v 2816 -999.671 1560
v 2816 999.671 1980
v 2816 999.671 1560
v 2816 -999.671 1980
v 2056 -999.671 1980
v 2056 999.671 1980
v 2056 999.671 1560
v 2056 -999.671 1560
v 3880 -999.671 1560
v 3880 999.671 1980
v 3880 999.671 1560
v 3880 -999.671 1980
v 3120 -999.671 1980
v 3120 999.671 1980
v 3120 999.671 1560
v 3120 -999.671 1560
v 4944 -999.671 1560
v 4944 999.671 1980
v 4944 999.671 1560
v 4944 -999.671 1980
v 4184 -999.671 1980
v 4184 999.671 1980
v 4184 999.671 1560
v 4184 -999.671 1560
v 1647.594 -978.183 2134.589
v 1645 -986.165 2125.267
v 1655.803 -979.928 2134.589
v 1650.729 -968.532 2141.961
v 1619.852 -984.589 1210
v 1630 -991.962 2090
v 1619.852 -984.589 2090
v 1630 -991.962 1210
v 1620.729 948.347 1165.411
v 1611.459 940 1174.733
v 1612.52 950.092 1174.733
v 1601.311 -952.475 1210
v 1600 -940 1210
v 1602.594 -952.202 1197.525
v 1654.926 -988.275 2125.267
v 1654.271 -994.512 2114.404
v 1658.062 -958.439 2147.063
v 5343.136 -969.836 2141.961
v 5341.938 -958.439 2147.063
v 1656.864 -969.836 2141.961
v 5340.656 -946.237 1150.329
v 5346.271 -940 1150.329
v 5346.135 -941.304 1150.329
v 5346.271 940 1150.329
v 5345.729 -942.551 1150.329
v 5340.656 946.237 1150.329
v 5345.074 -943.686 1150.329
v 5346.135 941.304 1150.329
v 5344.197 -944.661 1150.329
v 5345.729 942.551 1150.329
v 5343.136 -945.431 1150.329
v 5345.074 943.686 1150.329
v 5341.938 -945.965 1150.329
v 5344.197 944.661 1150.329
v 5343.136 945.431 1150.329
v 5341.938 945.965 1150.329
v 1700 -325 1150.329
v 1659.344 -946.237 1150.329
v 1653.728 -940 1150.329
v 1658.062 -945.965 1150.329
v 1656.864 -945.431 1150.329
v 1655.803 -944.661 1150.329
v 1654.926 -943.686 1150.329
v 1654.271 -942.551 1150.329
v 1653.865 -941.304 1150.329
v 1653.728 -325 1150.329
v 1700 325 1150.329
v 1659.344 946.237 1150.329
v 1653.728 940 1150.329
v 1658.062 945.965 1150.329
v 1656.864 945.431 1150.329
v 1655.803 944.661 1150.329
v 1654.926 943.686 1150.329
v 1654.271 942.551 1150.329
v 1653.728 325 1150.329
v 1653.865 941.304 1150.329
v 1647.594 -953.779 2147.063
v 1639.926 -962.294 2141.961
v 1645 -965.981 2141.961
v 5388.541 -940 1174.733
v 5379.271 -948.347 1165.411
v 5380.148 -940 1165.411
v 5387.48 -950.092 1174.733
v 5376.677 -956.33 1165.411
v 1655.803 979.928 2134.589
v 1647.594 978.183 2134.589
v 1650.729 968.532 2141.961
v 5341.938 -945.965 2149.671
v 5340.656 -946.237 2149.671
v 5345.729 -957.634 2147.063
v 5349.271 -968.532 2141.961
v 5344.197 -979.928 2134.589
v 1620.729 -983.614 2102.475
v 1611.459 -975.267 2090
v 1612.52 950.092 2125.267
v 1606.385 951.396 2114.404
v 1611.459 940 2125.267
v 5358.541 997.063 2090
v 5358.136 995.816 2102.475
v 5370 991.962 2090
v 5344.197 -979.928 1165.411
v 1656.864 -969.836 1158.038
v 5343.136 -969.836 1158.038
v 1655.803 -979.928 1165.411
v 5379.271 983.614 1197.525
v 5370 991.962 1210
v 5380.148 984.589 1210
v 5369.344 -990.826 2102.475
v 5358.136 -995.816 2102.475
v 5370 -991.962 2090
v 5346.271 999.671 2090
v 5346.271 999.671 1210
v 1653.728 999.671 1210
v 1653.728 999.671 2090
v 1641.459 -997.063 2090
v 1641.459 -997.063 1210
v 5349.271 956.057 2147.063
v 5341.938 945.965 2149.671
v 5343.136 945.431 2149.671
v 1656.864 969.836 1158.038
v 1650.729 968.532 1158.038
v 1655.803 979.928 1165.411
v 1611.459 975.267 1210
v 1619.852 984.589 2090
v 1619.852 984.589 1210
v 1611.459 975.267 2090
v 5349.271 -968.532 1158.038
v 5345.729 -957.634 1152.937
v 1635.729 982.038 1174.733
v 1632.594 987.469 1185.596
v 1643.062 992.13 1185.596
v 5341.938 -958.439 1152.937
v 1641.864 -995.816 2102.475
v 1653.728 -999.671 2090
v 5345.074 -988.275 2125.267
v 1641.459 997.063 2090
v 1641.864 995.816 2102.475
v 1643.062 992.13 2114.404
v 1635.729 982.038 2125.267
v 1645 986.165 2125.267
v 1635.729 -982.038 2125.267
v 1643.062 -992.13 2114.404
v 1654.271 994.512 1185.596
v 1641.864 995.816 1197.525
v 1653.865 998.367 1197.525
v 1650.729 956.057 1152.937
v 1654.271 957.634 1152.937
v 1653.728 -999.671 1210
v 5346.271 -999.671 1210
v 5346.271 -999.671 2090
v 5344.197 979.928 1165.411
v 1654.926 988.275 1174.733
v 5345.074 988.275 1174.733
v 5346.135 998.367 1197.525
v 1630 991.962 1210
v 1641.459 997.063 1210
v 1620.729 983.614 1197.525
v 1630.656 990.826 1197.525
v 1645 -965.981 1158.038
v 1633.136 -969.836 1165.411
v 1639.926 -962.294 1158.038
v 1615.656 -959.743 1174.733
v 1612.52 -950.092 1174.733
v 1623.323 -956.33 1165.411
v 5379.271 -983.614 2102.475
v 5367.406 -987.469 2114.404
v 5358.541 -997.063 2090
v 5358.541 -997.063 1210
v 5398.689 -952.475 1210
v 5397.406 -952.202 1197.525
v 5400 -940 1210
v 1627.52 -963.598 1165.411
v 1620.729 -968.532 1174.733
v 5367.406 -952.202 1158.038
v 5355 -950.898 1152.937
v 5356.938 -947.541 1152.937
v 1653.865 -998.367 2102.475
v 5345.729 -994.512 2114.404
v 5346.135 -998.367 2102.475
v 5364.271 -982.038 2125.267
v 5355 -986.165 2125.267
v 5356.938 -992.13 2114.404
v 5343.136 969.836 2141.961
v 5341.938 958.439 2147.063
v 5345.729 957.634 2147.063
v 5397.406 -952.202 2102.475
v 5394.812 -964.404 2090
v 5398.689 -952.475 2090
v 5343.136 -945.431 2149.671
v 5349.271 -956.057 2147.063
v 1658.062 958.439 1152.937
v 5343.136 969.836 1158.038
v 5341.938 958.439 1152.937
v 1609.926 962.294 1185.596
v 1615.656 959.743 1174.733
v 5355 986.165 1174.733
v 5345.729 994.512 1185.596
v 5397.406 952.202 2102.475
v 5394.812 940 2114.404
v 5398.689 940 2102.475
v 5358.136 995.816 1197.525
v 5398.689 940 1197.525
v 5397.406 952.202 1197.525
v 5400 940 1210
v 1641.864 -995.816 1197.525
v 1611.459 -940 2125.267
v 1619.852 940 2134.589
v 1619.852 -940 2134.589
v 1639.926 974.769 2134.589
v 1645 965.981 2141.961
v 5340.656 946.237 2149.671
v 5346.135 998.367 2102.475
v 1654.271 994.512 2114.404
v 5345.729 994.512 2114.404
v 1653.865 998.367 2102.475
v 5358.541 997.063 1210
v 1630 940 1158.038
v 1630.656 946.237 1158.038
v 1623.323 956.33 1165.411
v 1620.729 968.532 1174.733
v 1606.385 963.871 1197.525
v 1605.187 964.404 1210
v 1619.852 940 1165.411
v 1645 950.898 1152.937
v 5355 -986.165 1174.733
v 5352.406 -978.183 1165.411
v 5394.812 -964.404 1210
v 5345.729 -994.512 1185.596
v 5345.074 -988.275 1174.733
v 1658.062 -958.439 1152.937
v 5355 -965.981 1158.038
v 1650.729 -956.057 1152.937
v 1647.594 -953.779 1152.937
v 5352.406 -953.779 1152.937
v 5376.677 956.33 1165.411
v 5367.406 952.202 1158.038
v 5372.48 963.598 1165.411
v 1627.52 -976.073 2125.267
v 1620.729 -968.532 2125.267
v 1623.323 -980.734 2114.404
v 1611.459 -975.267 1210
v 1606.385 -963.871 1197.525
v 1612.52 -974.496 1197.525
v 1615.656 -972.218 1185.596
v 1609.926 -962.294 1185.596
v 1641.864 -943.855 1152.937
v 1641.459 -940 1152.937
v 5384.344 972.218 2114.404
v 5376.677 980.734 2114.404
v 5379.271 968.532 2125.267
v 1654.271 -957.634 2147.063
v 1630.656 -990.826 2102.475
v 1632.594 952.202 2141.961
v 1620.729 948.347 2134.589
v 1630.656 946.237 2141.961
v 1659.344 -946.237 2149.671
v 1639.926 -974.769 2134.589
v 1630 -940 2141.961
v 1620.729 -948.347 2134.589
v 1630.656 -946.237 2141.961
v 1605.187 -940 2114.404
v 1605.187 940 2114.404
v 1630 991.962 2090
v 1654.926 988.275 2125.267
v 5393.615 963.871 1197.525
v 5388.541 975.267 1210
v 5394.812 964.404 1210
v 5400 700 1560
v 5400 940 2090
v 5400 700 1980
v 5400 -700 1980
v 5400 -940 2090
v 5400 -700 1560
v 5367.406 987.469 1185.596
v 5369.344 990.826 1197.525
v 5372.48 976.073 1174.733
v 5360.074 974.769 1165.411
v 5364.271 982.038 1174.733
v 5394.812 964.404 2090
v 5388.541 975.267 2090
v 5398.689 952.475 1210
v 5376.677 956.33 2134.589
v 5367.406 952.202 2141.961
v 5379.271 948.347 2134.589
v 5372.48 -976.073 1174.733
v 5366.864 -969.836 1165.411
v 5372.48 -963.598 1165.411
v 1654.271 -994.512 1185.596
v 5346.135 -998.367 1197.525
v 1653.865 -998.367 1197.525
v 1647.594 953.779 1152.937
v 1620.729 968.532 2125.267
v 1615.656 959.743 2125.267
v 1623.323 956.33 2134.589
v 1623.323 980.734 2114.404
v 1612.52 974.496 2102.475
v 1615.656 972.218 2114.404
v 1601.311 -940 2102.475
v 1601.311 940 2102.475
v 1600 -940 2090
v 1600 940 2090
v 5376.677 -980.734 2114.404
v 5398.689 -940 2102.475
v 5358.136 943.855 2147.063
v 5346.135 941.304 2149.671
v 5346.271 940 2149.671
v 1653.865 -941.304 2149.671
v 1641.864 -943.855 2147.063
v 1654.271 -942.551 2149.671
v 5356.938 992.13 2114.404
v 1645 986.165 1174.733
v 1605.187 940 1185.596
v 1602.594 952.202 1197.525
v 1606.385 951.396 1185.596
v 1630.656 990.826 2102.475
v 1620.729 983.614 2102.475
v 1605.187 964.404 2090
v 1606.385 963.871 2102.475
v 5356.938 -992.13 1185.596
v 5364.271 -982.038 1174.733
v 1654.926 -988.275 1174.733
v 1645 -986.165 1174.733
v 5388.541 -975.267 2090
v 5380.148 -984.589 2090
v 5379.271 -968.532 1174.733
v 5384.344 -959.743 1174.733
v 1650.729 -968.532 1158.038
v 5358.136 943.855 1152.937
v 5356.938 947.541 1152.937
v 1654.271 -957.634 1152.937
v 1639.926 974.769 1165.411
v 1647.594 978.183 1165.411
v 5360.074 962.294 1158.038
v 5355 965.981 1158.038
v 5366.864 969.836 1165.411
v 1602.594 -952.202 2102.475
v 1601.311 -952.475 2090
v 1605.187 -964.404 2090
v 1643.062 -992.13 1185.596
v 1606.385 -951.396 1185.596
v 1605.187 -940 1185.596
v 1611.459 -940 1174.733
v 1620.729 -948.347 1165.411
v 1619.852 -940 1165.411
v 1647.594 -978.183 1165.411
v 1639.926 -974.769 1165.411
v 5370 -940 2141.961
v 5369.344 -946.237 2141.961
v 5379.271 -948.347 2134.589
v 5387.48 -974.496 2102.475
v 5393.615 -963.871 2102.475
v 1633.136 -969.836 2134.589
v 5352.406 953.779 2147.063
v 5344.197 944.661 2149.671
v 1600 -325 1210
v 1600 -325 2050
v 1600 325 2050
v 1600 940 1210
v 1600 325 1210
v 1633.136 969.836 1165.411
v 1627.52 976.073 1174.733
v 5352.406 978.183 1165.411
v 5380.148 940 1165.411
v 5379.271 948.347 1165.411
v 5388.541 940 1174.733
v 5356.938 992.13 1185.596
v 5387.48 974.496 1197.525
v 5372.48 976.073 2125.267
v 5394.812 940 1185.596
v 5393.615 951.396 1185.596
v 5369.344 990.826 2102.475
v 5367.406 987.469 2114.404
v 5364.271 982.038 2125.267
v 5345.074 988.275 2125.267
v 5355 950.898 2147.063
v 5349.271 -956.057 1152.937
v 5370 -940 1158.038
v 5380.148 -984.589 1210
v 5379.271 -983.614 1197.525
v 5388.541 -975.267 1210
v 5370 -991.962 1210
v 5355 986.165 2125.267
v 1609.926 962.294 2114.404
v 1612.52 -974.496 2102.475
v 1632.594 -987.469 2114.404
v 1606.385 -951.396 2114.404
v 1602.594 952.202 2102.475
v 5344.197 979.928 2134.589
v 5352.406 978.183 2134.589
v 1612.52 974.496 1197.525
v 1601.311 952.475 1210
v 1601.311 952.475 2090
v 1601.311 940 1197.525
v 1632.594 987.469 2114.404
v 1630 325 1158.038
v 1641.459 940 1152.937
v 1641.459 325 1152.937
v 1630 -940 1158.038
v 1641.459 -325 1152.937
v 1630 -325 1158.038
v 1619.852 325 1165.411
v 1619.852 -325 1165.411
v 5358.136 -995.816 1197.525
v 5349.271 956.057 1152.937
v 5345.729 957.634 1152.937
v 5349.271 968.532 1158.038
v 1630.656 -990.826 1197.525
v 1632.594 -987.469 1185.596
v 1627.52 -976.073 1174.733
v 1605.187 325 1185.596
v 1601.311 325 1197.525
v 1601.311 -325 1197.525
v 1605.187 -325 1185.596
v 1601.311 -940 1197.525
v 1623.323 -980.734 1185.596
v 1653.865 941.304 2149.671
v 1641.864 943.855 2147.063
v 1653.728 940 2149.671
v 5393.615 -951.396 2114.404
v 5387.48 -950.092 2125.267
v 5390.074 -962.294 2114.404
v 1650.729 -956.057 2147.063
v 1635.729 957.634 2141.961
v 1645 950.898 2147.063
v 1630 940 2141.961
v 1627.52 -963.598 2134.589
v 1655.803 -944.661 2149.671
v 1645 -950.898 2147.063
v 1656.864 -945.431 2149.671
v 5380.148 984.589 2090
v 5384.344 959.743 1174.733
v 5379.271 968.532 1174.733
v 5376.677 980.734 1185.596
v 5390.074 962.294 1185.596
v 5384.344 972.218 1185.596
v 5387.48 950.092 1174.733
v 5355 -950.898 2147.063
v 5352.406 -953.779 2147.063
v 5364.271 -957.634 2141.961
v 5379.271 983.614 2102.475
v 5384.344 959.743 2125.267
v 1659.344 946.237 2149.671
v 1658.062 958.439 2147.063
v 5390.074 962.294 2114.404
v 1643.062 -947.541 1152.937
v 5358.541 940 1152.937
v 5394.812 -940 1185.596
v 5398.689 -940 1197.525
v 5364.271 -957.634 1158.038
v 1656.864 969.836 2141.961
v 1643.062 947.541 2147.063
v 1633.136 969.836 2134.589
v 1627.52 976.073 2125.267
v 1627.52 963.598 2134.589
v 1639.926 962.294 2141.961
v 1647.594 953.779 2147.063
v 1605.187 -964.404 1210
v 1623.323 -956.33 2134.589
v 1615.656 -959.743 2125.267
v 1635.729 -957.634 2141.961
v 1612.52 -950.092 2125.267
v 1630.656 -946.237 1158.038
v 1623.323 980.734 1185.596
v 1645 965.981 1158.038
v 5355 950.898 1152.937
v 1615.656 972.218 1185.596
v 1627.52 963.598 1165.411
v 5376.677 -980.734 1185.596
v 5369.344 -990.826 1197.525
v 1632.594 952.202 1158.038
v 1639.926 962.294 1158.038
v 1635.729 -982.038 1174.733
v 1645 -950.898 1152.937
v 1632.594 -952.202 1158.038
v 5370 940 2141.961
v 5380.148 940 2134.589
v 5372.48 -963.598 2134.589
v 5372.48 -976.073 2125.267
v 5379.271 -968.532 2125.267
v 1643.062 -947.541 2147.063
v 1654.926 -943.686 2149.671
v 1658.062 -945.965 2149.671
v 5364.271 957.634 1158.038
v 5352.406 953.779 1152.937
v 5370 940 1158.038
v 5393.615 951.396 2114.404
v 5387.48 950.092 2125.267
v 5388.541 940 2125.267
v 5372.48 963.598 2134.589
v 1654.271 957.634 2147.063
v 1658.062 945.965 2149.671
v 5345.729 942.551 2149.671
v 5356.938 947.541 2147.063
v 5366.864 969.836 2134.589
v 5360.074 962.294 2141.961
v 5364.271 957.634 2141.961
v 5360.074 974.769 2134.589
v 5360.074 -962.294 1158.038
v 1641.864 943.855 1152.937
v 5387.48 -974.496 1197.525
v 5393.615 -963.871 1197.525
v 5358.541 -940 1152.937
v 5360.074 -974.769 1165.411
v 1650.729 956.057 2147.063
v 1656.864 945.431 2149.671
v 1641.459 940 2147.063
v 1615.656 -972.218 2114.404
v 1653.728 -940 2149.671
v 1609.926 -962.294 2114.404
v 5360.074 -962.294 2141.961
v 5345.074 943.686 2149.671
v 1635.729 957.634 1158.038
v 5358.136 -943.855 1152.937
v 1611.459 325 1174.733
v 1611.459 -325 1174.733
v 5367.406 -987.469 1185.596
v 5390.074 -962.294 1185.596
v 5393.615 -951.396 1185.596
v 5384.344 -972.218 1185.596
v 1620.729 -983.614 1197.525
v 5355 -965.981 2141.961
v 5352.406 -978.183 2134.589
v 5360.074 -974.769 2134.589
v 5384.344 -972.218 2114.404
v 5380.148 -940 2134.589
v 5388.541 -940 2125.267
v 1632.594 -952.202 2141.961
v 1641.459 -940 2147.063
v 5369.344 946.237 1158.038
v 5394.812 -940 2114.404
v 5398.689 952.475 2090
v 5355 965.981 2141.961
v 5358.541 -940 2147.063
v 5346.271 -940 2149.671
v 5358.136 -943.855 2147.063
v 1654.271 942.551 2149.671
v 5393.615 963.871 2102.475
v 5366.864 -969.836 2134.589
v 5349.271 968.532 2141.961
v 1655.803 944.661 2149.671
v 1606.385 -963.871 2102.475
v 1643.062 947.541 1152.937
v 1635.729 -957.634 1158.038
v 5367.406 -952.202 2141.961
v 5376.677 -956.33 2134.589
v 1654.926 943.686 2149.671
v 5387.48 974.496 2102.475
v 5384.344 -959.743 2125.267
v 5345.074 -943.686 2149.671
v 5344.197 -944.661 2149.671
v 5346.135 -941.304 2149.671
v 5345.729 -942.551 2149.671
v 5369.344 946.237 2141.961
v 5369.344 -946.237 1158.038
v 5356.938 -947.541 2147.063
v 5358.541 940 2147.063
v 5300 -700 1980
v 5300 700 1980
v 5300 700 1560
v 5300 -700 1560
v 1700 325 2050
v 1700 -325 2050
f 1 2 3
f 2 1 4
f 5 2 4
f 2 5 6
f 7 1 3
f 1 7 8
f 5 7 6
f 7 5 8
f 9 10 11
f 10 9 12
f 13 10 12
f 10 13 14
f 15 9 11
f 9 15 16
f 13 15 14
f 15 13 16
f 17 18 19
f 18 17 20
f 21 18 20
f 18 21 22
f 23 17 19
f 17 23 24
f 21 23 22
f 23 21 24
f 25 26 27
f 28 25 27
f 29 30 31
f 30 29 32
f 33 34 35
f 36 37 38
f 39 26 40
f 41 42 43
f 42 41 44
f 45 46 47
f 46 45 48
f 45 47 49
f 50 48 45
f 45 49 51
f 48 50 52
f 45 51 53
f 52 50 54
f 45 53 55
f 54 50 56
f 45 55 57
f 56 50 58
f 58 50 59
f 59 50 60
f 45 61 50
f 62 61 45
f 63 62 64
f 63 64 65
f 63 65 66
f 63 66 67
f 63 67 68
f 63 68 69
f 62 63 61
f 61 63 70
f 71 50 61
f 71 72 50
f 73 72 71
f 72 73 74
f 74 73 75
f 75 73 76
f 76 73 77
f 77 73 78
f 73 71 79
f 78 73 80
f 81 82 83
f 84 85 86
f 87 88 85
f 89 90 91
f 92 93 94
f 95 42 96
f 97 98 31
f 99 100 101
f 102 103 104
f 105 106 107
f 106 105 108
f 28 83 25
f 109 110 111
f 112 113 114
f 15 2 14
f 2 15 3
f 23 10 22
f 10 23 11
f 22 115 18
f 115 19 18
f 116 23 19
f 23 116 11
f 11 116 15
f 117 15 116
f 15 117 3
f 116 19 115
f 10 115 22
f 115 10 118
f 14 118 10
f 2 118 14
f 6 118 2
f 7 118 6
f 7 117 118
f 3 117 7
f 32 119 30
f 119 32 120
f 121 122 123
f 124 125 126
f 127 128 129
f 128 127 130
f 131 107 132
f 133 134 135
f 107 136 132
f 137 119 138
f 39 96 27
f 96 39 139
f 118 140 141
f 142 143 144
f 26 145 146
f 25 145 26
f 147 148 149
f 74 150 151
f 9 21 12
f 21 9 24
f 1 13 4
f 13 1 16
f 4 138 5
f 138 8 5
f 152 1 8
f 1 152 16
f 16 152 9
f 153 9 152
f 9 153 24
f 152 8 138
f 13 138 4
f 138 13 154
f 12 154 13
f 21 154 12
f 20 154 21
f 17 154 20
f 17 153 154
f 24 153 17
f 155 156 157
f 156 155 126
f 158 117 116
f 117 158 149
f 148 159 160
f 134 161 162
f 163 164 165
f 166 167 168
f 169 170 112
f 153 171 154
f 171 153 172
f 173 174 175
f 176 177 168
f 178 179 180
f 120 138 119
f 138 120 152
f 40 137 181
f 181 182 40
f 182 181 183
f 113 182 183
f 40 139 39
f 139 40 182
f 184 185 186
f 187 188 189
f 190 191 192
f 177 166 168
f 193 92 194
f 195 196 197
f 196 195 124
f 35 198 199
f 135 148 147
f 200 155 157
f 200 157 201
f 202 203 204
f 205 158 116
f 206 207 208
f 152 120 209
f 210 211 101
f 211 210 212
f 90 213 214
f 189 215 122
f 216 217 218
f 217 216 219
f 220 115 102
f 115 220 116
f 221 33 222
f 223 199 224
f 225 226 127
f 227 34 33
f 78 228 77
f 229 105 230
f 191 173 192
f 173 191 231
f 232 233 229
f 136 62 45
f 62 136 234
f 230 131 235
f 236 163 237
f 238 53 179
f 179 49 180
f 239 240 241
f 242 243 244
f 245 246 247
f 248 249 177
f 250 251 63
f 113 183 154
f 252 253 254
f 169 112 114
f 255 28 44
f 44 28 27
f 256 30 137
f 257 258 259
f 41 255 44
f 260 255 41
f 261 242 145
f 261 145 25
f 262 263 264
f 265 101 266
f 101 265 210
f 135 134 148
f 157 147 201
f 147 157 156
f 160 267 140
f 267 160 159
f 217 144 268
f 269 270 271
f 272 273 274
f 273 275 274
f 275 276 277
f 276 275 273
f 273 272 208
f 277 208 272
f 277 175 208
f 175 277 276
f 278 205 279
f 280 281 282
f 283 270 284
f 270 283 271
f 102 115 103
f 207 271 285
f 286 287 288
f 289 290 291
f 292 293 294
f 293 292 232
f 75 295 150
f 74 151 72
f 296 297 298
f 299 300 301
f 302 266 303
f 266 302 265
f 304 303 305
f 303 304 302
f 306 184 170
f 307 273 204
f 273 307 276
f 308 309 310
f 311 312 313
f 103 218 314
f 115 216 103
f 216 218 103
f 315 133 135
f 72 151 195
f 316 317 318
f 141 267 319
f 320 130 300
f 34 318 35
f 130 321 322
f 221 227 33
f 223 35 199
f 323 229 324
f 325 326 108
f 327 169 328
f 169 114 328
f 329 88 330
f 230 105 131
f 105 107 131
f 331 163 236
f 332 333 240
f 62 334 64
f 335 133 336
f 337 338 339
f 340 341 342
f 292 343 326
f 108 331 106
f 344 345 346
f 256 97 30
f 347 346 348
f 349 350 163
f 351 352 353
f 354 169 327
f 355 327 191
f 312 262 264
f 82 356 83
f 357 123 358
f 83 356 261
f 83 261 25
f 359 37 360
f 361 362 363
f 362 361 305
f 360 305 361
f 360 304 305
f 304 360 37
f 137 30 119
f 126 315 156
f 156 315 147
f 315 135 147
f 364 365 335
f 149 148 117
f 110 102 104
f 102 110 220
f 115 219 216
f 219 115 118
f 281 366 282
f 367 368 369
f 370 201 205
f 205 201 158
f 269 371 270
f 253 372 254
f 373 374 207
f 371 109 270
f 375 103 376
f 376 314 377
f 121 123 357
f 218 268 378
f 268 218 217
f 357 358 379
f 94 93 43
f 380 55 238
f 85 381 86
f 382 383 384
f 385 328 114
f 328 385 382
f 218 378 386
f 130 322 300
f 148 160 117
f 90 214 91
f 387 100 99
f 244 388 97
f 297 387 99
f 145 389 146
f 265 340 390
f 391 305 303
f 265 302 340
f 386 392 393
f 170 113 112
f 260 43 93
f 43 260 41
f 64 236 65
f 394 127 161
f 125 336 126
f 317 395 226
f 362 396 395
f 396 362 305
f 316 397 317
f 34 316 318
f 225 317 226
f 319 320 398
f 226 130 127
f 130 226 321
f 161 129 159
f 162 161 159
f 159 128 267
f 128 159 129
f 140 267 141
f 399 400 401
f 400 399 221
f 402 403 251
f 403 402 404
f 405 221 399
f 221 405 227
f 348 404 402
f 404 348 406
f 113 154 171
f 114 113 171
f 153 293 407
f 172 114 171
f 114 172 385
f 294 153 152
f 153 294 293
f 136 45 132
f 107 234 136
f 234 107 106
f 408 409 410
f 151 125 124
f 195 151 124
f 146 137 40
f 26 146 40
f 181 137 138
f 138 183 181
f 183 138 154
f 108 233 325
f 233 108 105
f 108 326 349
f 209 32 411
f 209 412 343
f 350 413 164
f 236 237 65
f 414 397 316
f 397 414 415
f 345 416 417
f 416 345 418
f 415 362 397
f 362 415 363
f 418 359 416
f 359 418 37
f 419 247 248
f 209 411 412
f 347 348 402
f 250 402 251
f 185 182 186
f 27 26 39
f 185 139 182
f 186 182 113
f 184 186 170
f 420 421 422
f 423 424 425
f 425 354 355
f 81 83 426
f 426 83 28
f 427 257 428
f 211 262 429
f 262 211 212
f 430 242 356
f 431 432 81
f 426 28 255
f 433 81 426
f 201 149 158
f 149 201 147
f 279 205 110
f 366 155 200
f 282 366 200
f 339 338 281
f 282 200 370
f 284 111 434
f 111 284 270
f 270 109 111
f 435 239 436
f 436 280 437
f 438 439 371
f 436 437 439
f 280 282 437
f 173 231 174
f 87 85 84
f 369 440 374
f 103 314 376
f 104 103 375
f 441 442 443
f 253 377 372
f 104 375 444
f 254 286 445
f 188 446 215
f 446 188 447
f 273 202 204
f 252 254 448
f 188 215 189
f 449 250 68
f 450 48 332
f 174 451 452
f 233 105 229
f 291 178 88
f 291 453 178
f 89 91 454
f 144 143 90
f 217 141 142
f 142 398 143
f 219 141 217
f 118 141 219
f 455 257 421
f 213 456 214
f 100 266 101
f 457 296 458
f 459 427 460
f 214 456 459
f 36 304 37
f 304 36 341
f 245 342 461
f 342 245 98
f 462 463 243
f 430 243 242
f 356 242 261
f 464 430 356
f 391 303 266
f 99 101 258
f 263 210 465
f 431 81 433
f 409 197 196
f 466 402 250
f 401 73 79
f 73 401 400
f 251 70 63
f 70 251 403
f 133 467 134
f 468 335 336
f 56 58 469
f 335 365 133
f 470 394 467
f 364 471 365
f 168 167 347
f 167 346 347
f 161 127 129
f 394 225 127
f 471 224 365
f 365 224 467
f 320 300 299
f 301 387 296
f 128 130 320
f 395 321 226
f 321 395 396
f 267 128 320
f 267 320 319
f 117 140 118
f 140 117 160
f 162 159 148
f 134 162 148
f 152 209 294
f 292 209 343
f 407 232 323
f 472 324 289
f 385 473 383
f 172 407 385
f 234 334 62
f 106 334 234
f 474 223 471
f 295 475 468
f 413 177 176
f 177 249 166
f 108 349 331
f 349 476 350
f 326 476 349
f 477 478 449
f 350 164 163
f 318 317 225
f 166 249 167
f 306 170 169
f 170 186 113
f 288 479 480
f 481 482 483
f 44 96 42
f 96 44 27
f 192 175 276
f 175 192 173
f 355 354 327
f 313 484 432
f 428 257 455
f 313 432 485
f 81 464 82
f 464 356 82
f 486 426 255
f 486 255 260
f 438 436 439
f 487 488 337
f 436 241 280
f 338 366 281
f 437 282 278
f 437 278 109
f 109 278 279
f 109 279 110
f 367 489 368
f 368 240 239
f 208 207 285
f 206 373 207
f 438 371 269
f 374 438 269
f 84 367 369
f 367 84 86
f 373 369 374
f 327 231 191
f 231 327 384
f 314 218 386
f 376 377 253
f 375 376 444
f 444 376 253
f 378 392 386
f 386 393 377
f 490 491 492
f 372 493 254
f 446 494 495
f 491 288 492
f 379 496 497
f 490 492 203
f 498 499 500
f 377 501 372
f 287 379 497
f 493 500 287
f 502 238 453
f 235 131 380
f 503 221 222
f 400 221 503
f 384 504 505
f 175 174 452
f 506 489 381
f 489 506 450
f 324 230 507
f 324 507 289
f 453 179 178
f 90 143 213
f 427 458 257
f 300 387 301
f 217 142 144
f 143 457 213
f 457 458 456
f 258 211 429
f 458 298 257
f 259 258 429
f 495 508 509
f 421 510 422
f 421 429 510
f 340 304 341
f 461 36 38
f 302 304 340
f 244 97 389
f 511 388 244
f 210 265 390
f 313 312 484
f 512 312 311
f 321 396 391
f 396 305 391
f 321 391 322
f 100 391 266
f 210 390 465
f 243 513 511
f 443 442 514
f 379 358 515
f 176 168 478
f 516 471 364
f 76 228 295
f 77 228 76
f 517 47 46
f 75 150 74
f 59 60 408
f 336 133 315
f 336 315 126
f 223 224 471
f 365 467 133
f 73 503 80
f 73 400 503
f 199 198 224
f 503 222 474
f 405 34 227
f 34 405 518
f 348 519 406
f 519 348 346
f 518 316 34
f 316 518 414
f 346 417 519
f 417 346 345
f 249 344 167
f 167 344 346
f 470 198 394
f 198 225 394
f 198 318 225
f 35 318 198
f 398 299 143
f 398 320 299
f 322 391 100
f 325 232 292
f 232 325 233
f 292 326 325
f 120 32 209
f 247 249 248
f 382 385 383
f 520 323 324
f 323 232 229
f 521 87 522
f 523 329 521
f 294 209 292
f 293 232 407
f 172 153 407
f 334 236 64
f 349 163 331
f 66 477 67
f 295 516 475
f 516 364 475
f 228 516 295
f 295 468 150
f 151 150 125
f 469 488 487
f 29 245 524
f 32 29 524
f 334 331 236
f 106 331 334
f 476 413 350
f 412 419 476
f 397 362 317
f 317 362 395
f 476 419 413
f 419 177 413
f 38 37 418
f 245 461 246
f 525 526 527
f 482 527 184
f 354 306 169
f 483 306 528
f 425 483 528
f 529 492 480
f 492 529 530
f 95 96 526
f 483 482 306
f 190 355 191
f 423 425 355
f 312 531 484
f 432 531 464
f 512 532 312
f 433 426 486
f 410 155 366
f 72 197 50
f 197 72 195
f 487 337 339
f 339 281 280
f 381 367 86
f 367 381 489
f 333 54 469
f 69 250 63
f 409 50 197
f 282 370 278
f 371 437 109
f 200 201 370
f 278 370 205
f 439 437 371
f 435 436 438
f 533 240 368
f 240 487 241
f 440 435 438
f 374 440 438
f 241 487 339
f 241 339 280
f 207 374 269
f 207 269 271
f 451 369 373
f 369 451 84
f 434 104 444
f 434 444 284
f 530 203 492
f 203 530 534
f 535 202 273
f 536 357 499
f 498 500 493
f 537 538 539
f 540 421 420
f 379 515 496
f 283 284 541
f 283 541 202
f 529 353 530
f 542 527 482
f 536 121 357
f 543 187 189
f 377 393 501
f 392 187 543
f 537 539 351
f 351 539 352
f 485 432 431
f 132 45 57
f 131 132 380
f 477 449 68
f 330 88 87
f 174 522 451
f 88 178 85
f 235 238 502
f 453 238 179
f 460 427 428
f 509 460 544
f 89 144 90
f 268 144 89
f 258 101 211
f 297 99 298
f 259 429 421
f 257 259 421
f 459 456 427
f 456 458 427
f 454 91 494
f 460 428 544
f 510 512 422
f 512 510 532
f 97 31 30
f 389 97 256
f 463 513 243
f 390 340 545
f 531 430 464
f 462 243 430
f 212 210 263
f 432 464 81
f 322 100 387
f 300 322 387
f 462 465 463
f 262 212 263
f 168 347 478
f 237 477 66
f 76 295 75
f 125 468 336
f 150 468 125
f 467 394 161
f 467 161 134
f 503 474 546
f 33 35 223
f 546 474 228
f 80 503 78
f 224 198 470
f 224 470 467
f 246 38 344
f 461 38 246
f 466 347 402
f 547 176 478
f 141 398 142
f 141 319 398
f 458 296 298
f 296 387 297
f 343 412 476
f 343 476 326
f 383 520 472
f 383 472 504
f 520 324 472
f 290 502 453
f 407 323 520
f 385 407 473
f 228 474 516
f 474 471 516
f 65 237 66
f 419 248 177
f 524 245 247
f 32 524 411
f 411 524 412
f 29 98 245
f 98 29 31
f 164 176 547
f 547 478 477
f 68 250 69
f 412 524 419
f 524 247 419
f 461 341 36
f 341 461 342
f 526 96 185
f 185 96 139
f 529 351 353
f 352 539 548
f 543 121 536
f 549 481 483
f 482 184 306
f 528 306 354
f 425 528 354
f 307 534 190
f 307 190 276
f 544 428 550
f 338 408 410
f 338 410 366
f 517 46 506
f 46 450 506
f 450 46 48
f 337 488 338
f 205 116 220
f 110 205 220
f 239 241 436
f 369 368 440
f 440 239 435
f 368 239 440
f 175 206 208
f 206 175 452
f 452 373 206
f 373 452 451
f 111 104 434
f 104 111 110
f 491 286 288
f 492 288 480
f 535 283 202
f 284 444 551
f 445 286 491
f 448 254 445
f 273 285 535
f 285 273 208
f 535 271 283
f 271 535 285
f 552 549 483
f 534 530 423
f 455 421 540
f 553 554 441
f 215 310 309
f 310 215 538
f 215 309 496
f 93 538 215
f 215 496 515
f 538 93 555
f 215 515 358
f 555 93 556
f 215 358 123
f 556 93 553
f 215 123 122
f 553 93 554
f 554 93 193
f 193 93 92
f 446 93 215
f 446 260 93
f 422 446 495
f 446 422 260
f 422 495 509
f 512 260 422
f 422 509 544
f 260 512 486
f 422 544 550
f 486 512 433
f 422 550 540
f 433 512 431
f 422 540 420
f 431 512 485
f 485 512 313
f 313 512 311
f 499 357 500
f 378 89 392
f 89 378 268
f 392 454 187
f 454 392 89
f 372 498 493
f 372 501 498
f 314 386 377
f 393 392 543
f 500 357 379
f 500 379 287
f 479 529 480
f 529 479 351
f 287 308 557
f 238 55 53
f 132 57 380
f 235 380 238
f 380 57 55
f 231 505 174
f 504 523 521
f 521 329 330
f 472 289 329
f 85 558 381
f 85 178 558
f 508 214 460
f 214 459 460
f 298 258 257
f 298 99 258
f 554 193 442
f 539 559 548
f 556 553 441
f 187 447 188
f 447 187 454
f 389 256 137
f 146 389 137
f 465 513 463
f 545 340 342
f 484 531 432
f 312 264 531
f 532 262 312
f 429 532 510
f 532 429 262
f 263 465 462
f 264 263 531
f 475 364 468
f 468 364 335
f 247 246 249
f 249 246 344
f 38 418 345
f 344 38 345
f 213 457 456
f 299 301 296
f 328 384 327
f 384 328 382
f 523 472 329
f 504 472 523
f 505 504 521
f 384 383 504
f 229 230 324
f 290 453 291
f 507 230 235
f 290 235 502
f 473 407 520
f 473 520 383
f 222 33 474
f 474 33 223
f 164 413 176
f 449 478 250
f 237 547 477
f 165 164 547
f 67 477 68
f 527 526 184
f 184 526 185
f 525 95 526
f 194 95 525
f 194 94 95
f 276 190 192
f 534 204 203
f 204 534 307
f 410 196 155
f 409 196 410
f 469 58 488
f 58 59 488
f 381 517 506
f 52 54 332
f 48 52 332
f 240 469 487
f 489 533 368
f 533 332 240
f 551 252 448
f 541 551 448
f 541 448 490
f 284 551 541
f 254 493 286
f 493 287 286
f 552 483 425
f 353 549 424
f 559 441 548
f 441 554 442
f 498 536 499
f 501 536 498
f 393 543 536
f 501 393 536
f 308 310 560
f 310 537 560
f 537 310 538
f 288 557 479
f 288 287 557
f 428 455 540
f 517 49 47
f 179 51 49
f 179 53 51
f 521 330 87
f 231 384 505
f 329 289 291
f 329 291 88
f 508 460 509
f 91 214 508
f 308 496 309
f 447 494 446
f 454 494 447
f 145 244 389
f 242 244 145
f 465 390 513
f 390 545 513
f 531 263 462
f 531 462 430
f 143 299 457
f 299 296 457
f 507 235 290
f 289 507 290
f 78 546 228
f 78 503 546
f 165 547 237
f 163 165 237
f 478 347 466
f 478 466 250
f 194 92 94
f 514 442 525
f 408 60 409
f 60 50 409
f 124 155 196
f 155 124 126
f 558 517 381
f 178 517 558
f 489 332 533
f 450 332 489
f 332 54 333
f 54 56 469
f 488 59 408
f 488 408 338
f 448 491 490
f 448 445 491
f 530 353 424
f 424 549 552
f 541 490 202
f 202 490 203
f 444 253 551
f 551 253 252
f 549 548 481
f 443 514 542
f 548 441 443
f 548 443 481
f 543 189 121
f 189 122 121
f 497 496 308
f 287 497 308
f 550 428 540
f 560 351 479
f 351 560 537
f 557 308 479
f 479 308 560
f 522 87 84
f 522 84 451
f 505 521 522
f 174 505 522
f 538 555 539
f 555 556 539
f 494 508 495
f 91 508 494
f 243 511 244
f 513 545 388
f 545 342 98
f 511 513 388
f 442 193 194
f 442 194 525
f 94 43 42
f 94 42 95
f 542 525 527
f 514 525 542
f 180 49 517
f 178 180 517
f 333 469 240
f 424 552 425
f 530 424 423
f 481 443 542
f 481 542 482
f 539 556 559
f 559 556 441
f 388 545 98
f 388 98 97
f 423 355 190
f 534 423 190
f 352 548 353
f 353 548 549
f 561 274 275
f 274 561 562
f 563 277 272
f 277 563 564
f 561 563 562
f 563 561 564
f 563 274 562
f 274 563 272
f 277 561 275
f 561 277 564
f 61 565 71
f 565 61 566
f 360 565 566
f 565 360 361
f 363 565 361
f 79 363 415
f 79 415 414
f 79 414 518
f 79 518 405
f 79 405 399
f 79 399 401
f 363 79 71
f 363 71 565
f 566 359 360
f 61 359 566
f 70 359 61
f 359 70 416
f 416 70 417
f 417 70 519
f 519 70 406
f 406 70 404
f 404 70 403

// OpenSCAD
// file: ../lib/shapes.scad
// shapes.scad — small geometry helpers

// box with rounded corners, centered
module rounded_box(size, r = 40) {
  hull()
    for (x = [-size[0]/2 + r, size[0]/2 - r],
         y = [-size[1]/2 + r, size[1]/2 - r],
         z = [-size[2]/2 + r, size[2]/2 - r])
      translate([x, y, z]) sphere(r = r);
}

// rod between two points
module rod(p1, p2, d) {
  hull() {
    translate(p1) sphere(d = d);
    translate(p2) sphere(d = d);
  }
}

// symmetric NACA-4-digit-ish foil section, chord along +x, LE at origin
function naca_half(c, t, n) =
  [ for (i = [0 : n])
      let (u = i / n,
           yt = 5 * t * c * (0.2969 * sqrt(u) - 0.1260 * u
                - 0.3516 * u * u + 0.2843 * u * u * u
                - 0.1015 * u * u * u * u))
      [u * c, yt] ];

function foil_pts(c, t = 0.12, n = 24) =
  concat(naca_half(c, t, n),
         [ for (i = [n - 1 : -1 : 1])
             let (p = naca_half(c, t, n)[i]) [p[0], -p[1]] ]);
// main file
// cabin.scad — boat-home cabin on deck: berth, galley, wet head inside
include <../params.scad>
use <../lib/shapes.scad>

module cabin() {
  cl = cabin_x1 - cabin_x0;
  ch = cabin_roof_z - cabin_base_z;
  difference() {
    color("whitesmoke")
      translate([(cabin_x0 + cabin_x1) / 2, 0, cabin_base_z + ch / 2])
        rounded_box([cl, cabin_w, ch], r = 60);
    // side windows, 3 per side
    for (i = [0 : 2])
      translate([cabin_x0 + cl * (0.22 + 0.28 * i), 0,
                 cabin_base_z + ch * 0.62])
        cube([cl * 0.20, cabin_w + 200, ch * 0.42], center = true);
    // windshield (forward face)
    translate([cabin_x1, 0, cabin_base_z + ch * 0.62])
      cube([200, cabin_w * 0.7, ch * 0.42], center = true);
    // aft door
    translate([cabin_x0, 0, cabin_base_z + ch * 0.45])
      cube([200, 650, ch * 0.9], center = true);
  }
}

cabin();   // demo
